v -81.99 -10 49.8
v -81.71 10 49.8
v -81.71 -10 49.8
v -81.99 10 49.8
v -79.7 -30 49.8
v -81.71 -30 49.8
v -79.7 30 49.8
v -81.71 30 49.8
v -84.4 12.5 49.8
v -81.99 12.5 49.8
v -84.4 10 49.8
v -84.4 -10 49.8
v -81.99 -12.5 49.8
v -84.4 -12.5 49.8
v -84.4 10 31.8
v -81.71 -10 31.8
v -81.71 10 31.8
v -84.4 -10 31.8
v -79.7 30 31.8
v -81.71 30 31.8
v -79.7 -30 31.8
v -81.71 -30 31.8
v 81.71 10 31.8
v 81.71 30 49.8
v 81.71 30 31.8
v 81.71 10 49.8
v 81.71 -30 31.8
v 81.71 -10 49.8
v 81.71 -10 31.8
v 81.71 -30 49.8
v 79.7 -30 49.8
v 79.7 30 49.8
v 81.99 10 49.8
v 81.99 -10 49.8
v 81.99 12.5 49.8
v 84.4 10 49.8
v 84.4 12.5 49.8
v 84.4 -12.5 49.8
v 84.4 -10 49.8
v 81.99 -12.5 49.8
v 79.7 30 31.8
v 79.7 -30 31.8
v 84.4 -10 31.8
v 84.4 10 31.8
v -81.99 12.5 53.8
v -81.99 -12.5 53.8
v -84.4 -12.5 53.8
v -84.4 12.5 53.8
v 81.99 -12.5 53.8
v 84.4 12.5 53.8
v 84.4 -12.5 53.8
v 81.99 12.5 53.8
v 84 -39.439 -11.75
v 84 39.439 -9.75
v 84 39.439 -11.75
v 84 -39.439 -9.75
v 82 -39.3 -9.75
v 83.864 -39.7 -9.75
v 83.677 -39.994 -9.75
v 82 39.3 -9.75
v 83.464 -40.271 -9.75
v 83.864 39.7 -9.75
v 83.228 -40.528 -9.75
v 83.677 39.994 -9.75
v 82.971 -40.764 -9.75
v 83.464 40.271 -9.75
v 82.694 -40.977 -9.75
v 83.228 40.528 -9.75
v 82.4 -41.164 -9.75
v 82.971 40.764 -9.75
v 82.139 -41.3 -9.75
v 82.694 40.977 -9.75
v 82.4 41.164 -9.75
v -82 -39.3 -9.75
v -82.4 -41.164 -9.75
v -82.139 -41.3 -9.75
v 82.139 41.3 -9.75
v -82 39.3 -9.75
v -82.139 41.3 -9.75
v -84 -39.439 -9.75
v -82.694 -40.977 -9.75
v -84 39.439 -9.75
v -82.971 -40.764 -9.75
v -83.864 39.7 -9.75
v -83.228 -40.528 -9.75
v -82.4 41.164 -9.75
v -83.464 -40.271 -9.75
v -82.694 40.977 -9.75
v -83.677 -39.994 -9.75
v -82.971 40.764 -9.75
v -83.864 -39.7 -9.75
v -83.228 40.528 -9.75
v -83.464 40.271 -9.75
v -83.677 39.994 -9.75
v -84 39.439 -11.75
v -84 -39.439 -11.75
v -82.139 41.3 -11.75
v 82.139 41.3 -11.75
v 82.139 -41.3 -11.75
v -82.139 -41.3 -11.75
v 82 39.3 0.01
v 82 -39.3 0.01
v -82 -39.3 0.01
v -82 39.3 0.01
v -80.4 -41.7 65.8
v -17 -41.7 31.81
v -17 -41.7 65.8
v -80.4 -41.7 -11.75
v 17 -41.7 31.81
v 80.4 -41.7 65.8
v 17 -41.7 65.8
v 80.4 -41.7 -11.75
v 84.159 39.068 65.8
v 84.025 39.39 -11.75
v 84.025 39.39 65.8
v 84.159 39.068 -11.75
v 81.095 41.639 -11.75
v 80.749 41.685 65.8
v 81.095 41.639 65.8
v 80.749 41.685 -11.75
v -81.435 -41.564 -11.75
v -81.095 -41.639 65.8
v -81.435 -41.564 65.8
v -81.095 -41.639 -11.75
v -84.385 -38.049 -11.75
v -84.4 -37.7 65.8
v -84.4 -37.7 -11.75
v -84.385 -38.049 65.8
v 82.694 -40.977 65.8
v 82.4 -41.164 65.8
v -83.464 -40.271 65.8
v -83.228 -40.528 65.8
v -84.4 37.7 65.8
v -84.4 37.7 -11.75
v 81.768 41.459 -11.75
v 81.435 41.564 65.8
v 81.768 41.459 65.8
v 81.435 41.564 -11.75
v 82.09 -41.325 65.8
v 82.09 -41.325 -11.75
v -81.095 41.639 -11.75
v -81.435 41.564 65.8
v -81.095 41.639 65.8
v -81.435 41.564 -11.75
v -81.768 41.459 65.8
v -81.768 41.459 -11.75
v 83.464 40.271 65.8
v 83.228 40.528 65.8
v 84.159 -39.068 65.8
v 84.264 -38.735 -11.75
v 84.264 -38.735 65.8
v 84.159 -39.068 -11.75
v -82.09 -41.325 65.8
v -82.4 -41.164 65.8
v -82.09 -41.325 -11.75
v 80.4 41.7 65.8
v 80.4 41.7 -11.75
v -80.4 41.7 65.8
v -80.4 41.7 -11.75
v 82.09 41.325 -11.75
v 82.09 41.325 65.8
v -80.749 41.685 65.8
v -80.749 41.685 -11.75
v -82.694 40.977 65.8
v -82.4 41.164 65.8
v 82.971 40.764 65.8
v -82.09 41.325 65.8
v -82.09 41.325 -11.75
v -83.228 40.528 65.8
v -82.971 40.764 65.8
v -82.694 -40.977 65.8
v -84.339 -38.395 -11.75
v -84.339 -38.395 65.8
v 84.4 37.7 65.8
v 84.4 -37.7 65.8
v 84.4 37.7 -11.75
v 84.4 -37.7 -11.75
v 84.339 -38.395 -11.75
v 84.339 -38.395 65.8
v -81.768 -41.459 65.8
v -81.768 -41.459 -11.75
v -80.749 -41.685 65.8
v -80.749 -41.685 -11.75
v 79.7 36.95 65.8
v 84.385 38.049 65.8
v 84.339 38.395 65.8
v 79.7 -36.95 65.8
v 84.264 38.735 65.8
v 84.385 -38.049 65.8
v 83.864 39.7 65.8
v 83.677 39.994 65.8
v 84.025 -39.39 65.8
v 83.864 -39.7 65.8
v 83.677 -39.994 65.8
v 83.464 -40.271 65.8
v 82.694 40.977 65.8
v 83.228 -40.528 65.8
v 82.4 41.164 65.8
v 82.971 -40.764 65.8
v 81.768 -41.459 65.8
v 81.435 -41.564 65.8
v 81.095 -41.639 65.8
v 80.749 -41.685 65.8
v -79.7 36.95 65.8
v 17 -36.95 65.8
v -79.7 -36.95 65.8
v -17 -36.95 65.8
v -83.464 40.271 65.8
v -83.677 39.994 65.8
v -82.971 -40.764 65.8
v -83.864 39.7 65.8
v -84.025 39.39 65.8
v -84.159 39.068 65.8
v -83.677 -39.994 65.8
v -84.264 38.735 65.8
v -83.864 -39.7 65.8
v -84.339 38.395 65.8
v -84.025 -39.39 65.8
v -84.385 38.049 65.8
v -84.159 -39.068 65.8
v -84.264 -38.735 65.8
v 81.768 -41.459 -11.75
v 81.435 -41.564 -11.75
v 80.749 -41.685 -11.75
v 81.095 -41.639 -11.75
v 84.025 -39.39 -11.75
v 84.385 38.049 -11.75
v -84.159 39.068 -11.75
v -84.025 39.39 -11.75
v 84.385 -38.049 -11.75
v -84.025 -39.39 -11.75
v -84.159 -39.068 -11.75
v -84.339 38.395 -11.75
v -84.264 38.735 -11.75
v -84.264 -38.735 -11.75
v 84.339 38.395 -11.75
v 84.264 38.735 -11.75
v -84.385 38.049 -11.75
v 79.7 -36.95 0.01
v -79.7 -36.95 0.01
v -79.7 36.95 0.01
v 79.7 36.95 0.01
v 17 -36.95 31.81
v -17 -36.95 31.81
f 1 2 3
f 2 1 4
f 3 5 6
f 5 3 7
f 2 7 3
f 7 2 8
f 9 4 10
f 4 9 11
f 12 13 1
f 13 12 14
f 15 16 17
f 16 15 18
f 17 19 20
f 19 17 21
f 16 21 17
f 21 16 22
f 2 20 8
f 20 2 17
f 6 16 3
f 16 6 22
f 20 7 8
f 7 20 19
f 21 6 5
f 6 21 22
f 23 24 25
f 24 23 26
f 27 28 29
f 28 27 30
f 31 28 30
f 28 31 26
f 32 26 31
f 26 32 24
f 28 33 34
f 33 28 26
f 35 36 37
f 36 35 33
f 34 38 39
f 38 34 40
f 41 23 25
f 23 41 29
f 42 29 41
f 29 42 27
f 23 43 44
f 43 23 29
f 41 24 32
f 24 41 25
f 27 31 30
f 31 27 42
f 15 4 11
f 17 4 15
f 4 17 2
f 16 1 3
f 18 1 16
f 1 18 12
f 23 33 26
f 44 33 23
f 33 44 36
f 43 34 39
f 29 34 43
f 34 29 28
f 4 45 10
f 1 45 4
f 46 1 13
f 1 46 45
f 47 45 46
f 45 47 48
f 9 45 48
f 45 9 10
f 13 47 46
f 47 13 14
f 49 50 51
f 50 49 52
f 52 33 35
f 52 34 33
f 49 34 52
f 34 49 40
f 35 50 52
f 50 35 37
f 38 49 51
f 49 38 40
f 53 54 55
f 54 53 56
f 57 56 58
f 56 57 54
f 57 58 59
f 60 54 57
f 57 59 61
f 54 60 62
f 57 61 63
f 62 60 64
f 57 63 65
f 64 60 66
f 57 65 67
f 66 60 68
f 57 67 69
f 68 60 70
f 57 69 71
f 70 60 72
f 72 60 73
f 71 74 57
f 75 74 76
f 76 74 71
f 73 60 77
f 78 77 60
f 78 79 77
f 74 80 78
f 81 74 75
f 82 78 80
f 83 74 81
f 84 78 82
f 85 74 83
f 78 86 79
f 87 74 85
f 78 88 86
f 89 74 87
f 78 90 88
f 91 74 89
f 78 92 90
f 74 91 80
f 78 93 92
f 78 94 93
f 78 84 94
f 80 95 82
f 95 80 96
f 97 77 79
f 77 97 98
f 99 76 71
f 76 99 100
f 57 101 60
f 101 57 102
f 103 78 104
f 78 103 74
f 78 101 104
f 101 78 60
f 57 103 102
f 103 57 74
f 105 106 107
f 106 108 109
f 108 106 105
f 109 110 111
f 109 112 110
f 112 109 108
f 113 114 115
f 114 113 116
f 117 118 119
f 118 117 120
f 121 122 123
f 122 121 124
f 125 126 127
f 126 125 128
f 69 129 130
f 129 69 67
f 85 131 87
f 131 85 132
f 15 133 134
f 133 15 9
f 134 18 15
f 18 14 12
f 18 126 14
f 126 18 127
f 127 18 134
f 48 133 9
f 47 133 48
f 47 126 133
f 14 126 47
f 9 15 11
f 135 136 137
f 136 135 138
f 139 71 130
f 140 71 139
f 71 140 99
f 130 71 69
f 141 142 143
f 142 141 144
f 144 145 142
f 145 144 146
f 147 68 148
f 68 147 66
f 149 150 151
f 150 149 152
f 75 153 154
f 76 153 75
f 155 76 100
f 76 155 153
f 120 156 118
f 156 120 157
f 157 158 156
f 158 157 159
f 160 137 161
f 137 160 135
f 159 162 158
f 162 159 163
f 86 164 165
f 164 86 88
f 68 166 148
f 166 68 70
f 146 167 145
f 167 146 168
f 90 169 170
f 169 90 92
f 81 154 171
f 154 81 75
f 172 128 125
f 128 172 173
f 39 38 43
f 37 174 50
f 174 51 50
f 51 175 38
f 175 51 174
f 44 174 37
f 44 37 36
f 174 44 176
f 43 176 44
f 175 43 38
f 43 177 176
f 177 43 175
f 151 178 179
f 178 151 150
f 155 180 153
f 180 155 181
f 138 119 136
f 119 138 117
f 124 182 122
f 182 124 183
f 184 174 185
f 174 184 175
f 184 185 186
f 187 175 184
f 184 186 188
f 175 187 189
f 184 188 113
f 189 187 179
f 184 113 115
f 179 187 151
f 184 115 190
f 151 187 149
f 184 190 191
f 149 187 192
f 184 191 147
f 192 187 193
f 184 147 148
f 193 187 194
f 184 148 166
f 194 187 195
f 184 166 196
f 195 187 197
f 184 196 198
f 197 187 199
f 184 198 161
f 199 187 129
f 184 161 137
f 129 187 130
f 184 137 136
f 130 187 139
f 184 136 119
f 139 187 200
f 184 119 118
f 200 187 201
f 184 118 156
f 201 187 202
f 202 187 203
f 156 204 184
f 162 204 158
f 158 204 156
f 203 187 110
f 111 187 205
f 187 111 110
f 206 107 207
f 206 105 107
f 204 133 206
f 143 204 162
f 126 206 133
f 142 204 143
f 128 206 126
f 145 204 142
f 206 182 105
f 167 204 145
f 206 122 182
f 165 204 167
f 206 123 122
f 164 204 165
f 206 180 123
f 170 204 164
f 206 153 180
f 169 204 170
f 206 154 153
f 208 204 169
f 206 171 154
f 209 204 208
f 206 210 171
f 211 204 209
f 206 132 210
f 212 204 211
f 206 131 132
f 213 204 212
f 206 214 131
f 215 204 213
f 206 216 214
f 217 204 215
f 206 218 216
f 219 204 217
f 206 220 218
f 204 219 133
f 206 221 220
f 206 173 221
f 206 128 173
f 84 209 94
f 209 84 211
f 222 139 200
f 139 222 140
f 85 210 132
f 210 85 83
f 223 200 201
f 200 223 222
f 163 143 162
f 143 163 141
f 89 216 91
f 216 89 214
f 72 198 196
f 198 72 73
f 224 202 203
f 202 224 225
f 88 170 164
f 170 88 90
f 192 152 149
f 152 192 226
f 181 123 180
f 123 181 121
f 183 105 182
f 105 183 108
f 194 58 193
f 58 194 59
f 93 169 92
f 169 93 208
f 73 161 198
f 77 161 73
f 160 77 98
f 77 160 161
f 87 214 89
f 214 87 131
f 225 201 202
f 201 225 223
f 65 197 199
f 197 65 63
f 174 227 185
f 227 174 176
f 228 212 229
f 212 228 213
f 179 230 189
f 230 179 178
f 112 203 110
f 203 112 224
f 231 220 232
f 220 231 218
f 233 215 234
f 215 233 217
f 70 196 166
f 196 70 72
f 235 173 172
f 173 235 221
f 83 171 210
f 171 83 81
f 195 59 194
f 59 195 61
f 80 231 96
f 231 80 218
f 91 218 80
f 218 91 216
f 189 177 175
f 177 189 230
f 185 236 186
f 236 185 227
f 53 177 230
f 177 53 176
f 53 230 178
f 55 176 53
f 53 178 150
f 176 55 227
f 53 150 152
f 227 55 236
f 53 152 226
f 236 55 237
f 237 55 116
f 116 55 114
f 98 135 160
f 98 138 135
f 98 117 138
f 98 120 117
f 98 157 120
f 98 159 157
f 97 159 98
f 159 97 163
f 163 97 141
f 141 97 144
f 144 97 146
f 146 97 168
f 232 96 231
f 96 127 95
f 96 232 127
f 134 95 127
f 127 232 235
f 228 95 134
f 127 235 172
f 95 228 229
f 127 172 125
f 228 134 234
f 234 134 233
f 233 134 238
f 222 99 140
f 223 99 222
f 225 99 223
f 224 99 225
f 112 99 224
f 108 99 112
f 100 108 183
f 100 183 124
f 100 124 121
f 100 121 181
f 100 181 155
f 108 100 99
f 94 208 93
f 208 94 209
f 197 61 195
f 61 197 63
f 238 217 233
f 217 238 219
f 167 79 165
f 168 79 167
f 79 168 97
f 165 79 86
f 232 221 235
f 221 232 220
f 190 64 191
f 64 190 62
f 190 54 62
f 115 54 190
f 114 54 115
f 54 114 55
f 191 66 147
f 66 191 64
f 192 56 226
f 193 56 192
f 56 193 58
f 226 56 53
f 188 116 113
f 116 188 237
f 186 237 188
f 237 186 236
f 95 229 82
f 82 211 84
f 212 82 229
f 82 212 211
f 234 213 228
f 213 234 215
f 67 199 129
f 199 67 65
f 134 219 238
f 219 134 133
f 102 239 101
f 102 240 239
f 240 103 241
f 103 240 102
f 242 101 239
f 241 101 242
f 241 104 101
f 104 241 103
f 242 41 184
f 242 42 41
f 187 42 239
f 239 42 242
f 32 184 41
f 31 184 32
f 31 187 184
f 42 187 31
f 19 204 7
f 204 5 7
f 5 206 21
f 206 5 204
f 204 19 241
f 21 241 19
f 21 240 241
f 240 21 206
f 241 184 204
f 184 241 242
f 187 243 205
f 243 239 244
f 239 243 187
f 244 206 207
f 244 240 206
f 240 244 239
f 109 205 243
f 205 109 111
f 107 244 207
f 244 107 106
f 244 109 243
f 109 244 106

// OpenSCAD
// A phone VR viewer for CardboardXR, parametric in the phone.
//
// Why this exists: the viewer this project was built around is published as print files only, one
// set per phone, with no CAD source, so a new phone cannot be added to it. This is a separate
// design whose geometry comes from a table, so a phone is a row rather than a redraw.
//
// It is built around Cardboard v2 lenses (25 mm, about 34 mm focal length), the same lenses that
// viewer uses, because the app's lens distortion is the Cardboard SDK's and its built-in profile
// for them is exact (ViewerParams.CardboardV2).
//
// One difference worth knowing: the lenses are centred on the screen rather than sitting above a
// bottom tray as a Cardboard viewer's do. Cardboard's bottom alignment puts the optical axis
// 32 mm up a 73 mm screen, which costs vertical view at the bottom (about 50 degrees against the
// lens's 60); centred, both halves reach about 58. That is why the app needs the matching profile
// below and not the stock Cardboard one.
//
//   openscad -D 'part="body"'  -o body.stl  viewer.scad
//   openscad -D 'part="plate"' -o plate.stl viewer.scad
//   openscad -D 'part="door"'  -o door.stl  viewer.scad
//
// Print: PLA or PETG, 0.2 mm layers, 3 perimeters, no supports needed in these orientations.
// The body prints face-down (its open face on the plate).

// ---------------------------------------------------------------------------- what to export
part = "body";                 // "body", "plate", "door", or "preview"

// ---------------------------------------------------------------------------- the phone
// Body size and active screen area in mm. The screen area is pixels / ppi * 25.4, landscape, and
// decides where the lip can rest without covering anything.
//   iPhone 18 Pro Max  163.4 x 78.0 x 8.75   2868 x 1320 at 460 ppi
//   iPhone 16 Pro Max  163.4 x 78.0 x 8.25   2868 x 1320 at 460 ppi
//   iPhone 15 Pro      146.6 x 70.6 x 8.25   2556 x 1179 at 460 ppi
//   iPhone 16 Pro      149.6 x 71.5 x 8.25   2622 x 1206 at 460 ppi
phone_length    = 163.4;
phone_width     = 78.0;
phone_thickness = 8.75;
screen_length   = 158.4;
screen_width    = 72.9;

// How much bigger than the phone its pocket is, total across each axis.
phone_clearance = 0.6;
// How far the window's edge is kept off the active area, per side, so the lip rests on bezel only.
screen_margin = 0.5;

// ---------------------------------------------------------------------------- the lenses
lens_diameter     = 25.0;      // Cardboard v2
lens_seat_depth   = 3.0;       // pocket the lens drops into, from the screen side
lens_bore         = 23.0;      // what you look through; smaller than the lens, which it retains
inter_lens        = 63.9;      // ViewerParams.CardboardV2.interLensDistance, in mm

// Focus: how far the lens carriage can travel, around the profile's nominal screen-to-lens.
screen_to_lens_nominal = 39.3; // ViewerParams.CardboardV2.screenToLensDistance, in mm
focus_travel           = 6.0;  // either way

// ---------------------------------------------------------------------------- the shell
wall         = 2.4;
plate_height = 60.0;           // the carriage's height; must clear the lenses and the channels
plate_thick  = 6.0;
slide_depth  = 2.0;            // how far the channel is cut into each side wall
fit          = 0.4;            // sliding clearance, total
eye_relief   = 16.0;           // lens face to the viewer's own face
nose_width   = 34.0;           // must stay under the gap between the lenses
nose_height  = 22.0;
nose_depth   = 34.0;           // how far back from the face the notch runs
strap_slot   = [25.0, 4.0];    // for a 25 mm strap
door_inset   = 2.0;            // the door's thickness, and how deep its recess is
door_bar     = 20.0;           // the bar across the phone's back, which is all that holds it

$fn = 72;

// ---------------------------------------------------------------------------- derived
pocket_l = phone_length + phone_clearance;
pocket_w = phone_width + phone_clearance;
pocket_d = phone_thickness + phone_clearance;

// The window the lip leaves over the screen: wider than the active area, narrower than the pocket.
window_l = screen_length + 2 * screen_margin;
window_w = screen_width + 2 * screen_margin;

outer_l = pocket_l + 2 * wall;
outer_w = pocket_w + 2 * wall;

// Z runs from the screen, at 0, toward the face. The phone is behind it.
back_z  = -(pocket_d + wall);
// Where the carriage's back face may sit, and so how deep the shell has to be.
slide_back  = screen_to_lens_nominal - focus_travel - lens_seat_depth / 2;
slide_front = screen_to_lens_nominal + focus_travel - lens_seat_depth / 2 + plate_thick;
front_z = slide_front + eye_relief;

// The door's own outline: the recess it drops into, less a sliding clearance.
door_l = outer_l - 2 * wall + 2 * door_inset - fit;
door_w = outer_w - 2 * wall + 2 * door_inset - fit;

// The carriage rides in channels cut into the side walls, so it is wider than the window.
plate_l = window_l + 2 * slide_depth - fit;
// How far the thumb slot cuts, from the cavity wall out past the shell's face.
thumb_reach = outer_l / 2 + 1 - window_l / 2;

module rounded_box(size, radius) {
    hull() for (x = [-1, 1], y = [-1, 1])
        translate([x * (size[0] / 2 - radius), y * (size[1] / 2 - radius), 0])
            cylinder(h = size[2], r = radius, center = true);
}

// The shell: a tube open at the face, with the phone's pocket at the back behind a lip, the
// carriage's channels in its side walls, a notch for the nose and slots for a strap.
module body() {
    difference() {
        translate([0, 0, (front_z + back_z) / 2])
            rounded_box([outer_l, outer_w, front_z - back_z], 4);

        // The phone's pocket, from the open back right up to the screen plane at Z = 0. It has to
        // reach the screen plane: stopping at the phone's own thickness leaves a wall across its
        // face, and the lip that holds the phone comes from the window being smaller, not from this.
        translate([0, 0, back_z / 2])
            cube([pocket_l, pocket_w, -back_z + 0.02], center = true);

        // Everything in front of the screen, which the lip's edge defines.
        translate([0, 0, front_z / 2])
            cube([window_l, window_w, front_z + 0.02], center = true);

        // The channels the carriage slides along, one in each side wall.
        for (side = [-1, 1])
            translate([side * (window_l + slide_depth) / 2, 0, (slide_back + slide_front) / 2])
                cube([slide_depth + 0.02, plate_height, slide_front - slide_back], center = true);

        // A thumb slot each side, so the carriage can be pushed without taking the phone out. It
        // runs from inside the cavity out through the wall, so it meets the channel: a slot that
        // only cuts the wall leaves the carriage's edge still buried behind 0.3 mm of plastic.
        for (side = [-1, 1])
            translate([side * (window_l / 2 + thumb_reach / 2), 0, (slide_back + slide_front) / 2])
                cube([thumb_reach, 20, slide_front - slide_back], center = true);

        // The nose notch, in the bottom wall at the face end.
        translate([0, -outer_w / 2, front_z - nose_depth / 2 + 0.01])
            rounded_box([nose_width, 2 * nose_height, nose_depth], 6);

        // Strap slots, through both side walls near the face.
        for (side = [-1, 1])
            translate([side * outer_l / 2, 0, front_z - 14])
                cube([2 * wall + 0.02, strap_slot[0], strap_slot[1]], center = true);

        // The recess the door drops into: one door thick, at the very back, and only out to the
        // ring's outline, so a shoulder is left inside it for the ring to rest on.
        translate([0, 0, back_z + door_inset / 2 - 0.01])
            difference() {
                cube([door_l + fit, door_w + fit, door_inset + 0.02], center = true);
                cube([pocket_l, pocket_w, door_inset + 0.04], center = true);
            }
    }
}

// The lens carriage: a plate with a seat for each lens, which slides in the body's channels to
// focus. Friction holds it; `fit` is the only clearance.
module plate() {
    difference() {
        cube([plate_l, plate_height - fit, plate_thick], center = true);
        for (side = [-1, 1])
            translate([side * inter_lens / 2, 0, 0]) {
                // What you look through, all the way.
                cylinder(h = plate_thick + 0.02, d = lens_bore, center = true);
                // The pocket the lens drops into, open toward the screen.
                translate([0, 0, -(plate_thick - lens_seat_depth) / 2 - 0.01])
                    cylinder(h = lens_seat_depth + 0.02, d = lens_diameter + 0.3, center = true);
            }
    }
}

// The door: a ring that sits in the body's recess, with one bar across the middle of the phone's
// back. Both ends of the phone stay completely open, and so does everything but a strip at the
// centre.
//   That shape is deliberate. The rear camera is what the app uses for passthrough, hand tracking
// and reading a viewer's QR code, so a door that clipped the camera island would not look wrong,
// it would stop the tracking working. The island sits at one end of the phone and its size is not
// published in any form this file could rely on, so rather than cut an opening sized from a guess,
// the door holds the phone where no phone has a camera: across the middle.
module door() {
    union() {
        // The ring, which rests on the shoulder the body's recess leaves.
        difference() {
            cube([door_l, door_w, door_inset], center = true);
            cube([pocket_l, pocket_w, door_inset + 0.2], center = true);
        }
        // The bar, reaching the ring top and bottom so the part comes off the plate in one piece.
        cube([door_bar, door_w, door_inset], center = true);
    }
}

if (part == "body") body();
else if (part == "plate") plate();
else if (part == "door") door();
else {
    // Laid out as assembled, for a look before printing.
    body();
    #translate([0, 0, slide_back + plate_thick / 2]) plate();
    #translate([0, 0, back_z + door_inset / 2]) door();
}
